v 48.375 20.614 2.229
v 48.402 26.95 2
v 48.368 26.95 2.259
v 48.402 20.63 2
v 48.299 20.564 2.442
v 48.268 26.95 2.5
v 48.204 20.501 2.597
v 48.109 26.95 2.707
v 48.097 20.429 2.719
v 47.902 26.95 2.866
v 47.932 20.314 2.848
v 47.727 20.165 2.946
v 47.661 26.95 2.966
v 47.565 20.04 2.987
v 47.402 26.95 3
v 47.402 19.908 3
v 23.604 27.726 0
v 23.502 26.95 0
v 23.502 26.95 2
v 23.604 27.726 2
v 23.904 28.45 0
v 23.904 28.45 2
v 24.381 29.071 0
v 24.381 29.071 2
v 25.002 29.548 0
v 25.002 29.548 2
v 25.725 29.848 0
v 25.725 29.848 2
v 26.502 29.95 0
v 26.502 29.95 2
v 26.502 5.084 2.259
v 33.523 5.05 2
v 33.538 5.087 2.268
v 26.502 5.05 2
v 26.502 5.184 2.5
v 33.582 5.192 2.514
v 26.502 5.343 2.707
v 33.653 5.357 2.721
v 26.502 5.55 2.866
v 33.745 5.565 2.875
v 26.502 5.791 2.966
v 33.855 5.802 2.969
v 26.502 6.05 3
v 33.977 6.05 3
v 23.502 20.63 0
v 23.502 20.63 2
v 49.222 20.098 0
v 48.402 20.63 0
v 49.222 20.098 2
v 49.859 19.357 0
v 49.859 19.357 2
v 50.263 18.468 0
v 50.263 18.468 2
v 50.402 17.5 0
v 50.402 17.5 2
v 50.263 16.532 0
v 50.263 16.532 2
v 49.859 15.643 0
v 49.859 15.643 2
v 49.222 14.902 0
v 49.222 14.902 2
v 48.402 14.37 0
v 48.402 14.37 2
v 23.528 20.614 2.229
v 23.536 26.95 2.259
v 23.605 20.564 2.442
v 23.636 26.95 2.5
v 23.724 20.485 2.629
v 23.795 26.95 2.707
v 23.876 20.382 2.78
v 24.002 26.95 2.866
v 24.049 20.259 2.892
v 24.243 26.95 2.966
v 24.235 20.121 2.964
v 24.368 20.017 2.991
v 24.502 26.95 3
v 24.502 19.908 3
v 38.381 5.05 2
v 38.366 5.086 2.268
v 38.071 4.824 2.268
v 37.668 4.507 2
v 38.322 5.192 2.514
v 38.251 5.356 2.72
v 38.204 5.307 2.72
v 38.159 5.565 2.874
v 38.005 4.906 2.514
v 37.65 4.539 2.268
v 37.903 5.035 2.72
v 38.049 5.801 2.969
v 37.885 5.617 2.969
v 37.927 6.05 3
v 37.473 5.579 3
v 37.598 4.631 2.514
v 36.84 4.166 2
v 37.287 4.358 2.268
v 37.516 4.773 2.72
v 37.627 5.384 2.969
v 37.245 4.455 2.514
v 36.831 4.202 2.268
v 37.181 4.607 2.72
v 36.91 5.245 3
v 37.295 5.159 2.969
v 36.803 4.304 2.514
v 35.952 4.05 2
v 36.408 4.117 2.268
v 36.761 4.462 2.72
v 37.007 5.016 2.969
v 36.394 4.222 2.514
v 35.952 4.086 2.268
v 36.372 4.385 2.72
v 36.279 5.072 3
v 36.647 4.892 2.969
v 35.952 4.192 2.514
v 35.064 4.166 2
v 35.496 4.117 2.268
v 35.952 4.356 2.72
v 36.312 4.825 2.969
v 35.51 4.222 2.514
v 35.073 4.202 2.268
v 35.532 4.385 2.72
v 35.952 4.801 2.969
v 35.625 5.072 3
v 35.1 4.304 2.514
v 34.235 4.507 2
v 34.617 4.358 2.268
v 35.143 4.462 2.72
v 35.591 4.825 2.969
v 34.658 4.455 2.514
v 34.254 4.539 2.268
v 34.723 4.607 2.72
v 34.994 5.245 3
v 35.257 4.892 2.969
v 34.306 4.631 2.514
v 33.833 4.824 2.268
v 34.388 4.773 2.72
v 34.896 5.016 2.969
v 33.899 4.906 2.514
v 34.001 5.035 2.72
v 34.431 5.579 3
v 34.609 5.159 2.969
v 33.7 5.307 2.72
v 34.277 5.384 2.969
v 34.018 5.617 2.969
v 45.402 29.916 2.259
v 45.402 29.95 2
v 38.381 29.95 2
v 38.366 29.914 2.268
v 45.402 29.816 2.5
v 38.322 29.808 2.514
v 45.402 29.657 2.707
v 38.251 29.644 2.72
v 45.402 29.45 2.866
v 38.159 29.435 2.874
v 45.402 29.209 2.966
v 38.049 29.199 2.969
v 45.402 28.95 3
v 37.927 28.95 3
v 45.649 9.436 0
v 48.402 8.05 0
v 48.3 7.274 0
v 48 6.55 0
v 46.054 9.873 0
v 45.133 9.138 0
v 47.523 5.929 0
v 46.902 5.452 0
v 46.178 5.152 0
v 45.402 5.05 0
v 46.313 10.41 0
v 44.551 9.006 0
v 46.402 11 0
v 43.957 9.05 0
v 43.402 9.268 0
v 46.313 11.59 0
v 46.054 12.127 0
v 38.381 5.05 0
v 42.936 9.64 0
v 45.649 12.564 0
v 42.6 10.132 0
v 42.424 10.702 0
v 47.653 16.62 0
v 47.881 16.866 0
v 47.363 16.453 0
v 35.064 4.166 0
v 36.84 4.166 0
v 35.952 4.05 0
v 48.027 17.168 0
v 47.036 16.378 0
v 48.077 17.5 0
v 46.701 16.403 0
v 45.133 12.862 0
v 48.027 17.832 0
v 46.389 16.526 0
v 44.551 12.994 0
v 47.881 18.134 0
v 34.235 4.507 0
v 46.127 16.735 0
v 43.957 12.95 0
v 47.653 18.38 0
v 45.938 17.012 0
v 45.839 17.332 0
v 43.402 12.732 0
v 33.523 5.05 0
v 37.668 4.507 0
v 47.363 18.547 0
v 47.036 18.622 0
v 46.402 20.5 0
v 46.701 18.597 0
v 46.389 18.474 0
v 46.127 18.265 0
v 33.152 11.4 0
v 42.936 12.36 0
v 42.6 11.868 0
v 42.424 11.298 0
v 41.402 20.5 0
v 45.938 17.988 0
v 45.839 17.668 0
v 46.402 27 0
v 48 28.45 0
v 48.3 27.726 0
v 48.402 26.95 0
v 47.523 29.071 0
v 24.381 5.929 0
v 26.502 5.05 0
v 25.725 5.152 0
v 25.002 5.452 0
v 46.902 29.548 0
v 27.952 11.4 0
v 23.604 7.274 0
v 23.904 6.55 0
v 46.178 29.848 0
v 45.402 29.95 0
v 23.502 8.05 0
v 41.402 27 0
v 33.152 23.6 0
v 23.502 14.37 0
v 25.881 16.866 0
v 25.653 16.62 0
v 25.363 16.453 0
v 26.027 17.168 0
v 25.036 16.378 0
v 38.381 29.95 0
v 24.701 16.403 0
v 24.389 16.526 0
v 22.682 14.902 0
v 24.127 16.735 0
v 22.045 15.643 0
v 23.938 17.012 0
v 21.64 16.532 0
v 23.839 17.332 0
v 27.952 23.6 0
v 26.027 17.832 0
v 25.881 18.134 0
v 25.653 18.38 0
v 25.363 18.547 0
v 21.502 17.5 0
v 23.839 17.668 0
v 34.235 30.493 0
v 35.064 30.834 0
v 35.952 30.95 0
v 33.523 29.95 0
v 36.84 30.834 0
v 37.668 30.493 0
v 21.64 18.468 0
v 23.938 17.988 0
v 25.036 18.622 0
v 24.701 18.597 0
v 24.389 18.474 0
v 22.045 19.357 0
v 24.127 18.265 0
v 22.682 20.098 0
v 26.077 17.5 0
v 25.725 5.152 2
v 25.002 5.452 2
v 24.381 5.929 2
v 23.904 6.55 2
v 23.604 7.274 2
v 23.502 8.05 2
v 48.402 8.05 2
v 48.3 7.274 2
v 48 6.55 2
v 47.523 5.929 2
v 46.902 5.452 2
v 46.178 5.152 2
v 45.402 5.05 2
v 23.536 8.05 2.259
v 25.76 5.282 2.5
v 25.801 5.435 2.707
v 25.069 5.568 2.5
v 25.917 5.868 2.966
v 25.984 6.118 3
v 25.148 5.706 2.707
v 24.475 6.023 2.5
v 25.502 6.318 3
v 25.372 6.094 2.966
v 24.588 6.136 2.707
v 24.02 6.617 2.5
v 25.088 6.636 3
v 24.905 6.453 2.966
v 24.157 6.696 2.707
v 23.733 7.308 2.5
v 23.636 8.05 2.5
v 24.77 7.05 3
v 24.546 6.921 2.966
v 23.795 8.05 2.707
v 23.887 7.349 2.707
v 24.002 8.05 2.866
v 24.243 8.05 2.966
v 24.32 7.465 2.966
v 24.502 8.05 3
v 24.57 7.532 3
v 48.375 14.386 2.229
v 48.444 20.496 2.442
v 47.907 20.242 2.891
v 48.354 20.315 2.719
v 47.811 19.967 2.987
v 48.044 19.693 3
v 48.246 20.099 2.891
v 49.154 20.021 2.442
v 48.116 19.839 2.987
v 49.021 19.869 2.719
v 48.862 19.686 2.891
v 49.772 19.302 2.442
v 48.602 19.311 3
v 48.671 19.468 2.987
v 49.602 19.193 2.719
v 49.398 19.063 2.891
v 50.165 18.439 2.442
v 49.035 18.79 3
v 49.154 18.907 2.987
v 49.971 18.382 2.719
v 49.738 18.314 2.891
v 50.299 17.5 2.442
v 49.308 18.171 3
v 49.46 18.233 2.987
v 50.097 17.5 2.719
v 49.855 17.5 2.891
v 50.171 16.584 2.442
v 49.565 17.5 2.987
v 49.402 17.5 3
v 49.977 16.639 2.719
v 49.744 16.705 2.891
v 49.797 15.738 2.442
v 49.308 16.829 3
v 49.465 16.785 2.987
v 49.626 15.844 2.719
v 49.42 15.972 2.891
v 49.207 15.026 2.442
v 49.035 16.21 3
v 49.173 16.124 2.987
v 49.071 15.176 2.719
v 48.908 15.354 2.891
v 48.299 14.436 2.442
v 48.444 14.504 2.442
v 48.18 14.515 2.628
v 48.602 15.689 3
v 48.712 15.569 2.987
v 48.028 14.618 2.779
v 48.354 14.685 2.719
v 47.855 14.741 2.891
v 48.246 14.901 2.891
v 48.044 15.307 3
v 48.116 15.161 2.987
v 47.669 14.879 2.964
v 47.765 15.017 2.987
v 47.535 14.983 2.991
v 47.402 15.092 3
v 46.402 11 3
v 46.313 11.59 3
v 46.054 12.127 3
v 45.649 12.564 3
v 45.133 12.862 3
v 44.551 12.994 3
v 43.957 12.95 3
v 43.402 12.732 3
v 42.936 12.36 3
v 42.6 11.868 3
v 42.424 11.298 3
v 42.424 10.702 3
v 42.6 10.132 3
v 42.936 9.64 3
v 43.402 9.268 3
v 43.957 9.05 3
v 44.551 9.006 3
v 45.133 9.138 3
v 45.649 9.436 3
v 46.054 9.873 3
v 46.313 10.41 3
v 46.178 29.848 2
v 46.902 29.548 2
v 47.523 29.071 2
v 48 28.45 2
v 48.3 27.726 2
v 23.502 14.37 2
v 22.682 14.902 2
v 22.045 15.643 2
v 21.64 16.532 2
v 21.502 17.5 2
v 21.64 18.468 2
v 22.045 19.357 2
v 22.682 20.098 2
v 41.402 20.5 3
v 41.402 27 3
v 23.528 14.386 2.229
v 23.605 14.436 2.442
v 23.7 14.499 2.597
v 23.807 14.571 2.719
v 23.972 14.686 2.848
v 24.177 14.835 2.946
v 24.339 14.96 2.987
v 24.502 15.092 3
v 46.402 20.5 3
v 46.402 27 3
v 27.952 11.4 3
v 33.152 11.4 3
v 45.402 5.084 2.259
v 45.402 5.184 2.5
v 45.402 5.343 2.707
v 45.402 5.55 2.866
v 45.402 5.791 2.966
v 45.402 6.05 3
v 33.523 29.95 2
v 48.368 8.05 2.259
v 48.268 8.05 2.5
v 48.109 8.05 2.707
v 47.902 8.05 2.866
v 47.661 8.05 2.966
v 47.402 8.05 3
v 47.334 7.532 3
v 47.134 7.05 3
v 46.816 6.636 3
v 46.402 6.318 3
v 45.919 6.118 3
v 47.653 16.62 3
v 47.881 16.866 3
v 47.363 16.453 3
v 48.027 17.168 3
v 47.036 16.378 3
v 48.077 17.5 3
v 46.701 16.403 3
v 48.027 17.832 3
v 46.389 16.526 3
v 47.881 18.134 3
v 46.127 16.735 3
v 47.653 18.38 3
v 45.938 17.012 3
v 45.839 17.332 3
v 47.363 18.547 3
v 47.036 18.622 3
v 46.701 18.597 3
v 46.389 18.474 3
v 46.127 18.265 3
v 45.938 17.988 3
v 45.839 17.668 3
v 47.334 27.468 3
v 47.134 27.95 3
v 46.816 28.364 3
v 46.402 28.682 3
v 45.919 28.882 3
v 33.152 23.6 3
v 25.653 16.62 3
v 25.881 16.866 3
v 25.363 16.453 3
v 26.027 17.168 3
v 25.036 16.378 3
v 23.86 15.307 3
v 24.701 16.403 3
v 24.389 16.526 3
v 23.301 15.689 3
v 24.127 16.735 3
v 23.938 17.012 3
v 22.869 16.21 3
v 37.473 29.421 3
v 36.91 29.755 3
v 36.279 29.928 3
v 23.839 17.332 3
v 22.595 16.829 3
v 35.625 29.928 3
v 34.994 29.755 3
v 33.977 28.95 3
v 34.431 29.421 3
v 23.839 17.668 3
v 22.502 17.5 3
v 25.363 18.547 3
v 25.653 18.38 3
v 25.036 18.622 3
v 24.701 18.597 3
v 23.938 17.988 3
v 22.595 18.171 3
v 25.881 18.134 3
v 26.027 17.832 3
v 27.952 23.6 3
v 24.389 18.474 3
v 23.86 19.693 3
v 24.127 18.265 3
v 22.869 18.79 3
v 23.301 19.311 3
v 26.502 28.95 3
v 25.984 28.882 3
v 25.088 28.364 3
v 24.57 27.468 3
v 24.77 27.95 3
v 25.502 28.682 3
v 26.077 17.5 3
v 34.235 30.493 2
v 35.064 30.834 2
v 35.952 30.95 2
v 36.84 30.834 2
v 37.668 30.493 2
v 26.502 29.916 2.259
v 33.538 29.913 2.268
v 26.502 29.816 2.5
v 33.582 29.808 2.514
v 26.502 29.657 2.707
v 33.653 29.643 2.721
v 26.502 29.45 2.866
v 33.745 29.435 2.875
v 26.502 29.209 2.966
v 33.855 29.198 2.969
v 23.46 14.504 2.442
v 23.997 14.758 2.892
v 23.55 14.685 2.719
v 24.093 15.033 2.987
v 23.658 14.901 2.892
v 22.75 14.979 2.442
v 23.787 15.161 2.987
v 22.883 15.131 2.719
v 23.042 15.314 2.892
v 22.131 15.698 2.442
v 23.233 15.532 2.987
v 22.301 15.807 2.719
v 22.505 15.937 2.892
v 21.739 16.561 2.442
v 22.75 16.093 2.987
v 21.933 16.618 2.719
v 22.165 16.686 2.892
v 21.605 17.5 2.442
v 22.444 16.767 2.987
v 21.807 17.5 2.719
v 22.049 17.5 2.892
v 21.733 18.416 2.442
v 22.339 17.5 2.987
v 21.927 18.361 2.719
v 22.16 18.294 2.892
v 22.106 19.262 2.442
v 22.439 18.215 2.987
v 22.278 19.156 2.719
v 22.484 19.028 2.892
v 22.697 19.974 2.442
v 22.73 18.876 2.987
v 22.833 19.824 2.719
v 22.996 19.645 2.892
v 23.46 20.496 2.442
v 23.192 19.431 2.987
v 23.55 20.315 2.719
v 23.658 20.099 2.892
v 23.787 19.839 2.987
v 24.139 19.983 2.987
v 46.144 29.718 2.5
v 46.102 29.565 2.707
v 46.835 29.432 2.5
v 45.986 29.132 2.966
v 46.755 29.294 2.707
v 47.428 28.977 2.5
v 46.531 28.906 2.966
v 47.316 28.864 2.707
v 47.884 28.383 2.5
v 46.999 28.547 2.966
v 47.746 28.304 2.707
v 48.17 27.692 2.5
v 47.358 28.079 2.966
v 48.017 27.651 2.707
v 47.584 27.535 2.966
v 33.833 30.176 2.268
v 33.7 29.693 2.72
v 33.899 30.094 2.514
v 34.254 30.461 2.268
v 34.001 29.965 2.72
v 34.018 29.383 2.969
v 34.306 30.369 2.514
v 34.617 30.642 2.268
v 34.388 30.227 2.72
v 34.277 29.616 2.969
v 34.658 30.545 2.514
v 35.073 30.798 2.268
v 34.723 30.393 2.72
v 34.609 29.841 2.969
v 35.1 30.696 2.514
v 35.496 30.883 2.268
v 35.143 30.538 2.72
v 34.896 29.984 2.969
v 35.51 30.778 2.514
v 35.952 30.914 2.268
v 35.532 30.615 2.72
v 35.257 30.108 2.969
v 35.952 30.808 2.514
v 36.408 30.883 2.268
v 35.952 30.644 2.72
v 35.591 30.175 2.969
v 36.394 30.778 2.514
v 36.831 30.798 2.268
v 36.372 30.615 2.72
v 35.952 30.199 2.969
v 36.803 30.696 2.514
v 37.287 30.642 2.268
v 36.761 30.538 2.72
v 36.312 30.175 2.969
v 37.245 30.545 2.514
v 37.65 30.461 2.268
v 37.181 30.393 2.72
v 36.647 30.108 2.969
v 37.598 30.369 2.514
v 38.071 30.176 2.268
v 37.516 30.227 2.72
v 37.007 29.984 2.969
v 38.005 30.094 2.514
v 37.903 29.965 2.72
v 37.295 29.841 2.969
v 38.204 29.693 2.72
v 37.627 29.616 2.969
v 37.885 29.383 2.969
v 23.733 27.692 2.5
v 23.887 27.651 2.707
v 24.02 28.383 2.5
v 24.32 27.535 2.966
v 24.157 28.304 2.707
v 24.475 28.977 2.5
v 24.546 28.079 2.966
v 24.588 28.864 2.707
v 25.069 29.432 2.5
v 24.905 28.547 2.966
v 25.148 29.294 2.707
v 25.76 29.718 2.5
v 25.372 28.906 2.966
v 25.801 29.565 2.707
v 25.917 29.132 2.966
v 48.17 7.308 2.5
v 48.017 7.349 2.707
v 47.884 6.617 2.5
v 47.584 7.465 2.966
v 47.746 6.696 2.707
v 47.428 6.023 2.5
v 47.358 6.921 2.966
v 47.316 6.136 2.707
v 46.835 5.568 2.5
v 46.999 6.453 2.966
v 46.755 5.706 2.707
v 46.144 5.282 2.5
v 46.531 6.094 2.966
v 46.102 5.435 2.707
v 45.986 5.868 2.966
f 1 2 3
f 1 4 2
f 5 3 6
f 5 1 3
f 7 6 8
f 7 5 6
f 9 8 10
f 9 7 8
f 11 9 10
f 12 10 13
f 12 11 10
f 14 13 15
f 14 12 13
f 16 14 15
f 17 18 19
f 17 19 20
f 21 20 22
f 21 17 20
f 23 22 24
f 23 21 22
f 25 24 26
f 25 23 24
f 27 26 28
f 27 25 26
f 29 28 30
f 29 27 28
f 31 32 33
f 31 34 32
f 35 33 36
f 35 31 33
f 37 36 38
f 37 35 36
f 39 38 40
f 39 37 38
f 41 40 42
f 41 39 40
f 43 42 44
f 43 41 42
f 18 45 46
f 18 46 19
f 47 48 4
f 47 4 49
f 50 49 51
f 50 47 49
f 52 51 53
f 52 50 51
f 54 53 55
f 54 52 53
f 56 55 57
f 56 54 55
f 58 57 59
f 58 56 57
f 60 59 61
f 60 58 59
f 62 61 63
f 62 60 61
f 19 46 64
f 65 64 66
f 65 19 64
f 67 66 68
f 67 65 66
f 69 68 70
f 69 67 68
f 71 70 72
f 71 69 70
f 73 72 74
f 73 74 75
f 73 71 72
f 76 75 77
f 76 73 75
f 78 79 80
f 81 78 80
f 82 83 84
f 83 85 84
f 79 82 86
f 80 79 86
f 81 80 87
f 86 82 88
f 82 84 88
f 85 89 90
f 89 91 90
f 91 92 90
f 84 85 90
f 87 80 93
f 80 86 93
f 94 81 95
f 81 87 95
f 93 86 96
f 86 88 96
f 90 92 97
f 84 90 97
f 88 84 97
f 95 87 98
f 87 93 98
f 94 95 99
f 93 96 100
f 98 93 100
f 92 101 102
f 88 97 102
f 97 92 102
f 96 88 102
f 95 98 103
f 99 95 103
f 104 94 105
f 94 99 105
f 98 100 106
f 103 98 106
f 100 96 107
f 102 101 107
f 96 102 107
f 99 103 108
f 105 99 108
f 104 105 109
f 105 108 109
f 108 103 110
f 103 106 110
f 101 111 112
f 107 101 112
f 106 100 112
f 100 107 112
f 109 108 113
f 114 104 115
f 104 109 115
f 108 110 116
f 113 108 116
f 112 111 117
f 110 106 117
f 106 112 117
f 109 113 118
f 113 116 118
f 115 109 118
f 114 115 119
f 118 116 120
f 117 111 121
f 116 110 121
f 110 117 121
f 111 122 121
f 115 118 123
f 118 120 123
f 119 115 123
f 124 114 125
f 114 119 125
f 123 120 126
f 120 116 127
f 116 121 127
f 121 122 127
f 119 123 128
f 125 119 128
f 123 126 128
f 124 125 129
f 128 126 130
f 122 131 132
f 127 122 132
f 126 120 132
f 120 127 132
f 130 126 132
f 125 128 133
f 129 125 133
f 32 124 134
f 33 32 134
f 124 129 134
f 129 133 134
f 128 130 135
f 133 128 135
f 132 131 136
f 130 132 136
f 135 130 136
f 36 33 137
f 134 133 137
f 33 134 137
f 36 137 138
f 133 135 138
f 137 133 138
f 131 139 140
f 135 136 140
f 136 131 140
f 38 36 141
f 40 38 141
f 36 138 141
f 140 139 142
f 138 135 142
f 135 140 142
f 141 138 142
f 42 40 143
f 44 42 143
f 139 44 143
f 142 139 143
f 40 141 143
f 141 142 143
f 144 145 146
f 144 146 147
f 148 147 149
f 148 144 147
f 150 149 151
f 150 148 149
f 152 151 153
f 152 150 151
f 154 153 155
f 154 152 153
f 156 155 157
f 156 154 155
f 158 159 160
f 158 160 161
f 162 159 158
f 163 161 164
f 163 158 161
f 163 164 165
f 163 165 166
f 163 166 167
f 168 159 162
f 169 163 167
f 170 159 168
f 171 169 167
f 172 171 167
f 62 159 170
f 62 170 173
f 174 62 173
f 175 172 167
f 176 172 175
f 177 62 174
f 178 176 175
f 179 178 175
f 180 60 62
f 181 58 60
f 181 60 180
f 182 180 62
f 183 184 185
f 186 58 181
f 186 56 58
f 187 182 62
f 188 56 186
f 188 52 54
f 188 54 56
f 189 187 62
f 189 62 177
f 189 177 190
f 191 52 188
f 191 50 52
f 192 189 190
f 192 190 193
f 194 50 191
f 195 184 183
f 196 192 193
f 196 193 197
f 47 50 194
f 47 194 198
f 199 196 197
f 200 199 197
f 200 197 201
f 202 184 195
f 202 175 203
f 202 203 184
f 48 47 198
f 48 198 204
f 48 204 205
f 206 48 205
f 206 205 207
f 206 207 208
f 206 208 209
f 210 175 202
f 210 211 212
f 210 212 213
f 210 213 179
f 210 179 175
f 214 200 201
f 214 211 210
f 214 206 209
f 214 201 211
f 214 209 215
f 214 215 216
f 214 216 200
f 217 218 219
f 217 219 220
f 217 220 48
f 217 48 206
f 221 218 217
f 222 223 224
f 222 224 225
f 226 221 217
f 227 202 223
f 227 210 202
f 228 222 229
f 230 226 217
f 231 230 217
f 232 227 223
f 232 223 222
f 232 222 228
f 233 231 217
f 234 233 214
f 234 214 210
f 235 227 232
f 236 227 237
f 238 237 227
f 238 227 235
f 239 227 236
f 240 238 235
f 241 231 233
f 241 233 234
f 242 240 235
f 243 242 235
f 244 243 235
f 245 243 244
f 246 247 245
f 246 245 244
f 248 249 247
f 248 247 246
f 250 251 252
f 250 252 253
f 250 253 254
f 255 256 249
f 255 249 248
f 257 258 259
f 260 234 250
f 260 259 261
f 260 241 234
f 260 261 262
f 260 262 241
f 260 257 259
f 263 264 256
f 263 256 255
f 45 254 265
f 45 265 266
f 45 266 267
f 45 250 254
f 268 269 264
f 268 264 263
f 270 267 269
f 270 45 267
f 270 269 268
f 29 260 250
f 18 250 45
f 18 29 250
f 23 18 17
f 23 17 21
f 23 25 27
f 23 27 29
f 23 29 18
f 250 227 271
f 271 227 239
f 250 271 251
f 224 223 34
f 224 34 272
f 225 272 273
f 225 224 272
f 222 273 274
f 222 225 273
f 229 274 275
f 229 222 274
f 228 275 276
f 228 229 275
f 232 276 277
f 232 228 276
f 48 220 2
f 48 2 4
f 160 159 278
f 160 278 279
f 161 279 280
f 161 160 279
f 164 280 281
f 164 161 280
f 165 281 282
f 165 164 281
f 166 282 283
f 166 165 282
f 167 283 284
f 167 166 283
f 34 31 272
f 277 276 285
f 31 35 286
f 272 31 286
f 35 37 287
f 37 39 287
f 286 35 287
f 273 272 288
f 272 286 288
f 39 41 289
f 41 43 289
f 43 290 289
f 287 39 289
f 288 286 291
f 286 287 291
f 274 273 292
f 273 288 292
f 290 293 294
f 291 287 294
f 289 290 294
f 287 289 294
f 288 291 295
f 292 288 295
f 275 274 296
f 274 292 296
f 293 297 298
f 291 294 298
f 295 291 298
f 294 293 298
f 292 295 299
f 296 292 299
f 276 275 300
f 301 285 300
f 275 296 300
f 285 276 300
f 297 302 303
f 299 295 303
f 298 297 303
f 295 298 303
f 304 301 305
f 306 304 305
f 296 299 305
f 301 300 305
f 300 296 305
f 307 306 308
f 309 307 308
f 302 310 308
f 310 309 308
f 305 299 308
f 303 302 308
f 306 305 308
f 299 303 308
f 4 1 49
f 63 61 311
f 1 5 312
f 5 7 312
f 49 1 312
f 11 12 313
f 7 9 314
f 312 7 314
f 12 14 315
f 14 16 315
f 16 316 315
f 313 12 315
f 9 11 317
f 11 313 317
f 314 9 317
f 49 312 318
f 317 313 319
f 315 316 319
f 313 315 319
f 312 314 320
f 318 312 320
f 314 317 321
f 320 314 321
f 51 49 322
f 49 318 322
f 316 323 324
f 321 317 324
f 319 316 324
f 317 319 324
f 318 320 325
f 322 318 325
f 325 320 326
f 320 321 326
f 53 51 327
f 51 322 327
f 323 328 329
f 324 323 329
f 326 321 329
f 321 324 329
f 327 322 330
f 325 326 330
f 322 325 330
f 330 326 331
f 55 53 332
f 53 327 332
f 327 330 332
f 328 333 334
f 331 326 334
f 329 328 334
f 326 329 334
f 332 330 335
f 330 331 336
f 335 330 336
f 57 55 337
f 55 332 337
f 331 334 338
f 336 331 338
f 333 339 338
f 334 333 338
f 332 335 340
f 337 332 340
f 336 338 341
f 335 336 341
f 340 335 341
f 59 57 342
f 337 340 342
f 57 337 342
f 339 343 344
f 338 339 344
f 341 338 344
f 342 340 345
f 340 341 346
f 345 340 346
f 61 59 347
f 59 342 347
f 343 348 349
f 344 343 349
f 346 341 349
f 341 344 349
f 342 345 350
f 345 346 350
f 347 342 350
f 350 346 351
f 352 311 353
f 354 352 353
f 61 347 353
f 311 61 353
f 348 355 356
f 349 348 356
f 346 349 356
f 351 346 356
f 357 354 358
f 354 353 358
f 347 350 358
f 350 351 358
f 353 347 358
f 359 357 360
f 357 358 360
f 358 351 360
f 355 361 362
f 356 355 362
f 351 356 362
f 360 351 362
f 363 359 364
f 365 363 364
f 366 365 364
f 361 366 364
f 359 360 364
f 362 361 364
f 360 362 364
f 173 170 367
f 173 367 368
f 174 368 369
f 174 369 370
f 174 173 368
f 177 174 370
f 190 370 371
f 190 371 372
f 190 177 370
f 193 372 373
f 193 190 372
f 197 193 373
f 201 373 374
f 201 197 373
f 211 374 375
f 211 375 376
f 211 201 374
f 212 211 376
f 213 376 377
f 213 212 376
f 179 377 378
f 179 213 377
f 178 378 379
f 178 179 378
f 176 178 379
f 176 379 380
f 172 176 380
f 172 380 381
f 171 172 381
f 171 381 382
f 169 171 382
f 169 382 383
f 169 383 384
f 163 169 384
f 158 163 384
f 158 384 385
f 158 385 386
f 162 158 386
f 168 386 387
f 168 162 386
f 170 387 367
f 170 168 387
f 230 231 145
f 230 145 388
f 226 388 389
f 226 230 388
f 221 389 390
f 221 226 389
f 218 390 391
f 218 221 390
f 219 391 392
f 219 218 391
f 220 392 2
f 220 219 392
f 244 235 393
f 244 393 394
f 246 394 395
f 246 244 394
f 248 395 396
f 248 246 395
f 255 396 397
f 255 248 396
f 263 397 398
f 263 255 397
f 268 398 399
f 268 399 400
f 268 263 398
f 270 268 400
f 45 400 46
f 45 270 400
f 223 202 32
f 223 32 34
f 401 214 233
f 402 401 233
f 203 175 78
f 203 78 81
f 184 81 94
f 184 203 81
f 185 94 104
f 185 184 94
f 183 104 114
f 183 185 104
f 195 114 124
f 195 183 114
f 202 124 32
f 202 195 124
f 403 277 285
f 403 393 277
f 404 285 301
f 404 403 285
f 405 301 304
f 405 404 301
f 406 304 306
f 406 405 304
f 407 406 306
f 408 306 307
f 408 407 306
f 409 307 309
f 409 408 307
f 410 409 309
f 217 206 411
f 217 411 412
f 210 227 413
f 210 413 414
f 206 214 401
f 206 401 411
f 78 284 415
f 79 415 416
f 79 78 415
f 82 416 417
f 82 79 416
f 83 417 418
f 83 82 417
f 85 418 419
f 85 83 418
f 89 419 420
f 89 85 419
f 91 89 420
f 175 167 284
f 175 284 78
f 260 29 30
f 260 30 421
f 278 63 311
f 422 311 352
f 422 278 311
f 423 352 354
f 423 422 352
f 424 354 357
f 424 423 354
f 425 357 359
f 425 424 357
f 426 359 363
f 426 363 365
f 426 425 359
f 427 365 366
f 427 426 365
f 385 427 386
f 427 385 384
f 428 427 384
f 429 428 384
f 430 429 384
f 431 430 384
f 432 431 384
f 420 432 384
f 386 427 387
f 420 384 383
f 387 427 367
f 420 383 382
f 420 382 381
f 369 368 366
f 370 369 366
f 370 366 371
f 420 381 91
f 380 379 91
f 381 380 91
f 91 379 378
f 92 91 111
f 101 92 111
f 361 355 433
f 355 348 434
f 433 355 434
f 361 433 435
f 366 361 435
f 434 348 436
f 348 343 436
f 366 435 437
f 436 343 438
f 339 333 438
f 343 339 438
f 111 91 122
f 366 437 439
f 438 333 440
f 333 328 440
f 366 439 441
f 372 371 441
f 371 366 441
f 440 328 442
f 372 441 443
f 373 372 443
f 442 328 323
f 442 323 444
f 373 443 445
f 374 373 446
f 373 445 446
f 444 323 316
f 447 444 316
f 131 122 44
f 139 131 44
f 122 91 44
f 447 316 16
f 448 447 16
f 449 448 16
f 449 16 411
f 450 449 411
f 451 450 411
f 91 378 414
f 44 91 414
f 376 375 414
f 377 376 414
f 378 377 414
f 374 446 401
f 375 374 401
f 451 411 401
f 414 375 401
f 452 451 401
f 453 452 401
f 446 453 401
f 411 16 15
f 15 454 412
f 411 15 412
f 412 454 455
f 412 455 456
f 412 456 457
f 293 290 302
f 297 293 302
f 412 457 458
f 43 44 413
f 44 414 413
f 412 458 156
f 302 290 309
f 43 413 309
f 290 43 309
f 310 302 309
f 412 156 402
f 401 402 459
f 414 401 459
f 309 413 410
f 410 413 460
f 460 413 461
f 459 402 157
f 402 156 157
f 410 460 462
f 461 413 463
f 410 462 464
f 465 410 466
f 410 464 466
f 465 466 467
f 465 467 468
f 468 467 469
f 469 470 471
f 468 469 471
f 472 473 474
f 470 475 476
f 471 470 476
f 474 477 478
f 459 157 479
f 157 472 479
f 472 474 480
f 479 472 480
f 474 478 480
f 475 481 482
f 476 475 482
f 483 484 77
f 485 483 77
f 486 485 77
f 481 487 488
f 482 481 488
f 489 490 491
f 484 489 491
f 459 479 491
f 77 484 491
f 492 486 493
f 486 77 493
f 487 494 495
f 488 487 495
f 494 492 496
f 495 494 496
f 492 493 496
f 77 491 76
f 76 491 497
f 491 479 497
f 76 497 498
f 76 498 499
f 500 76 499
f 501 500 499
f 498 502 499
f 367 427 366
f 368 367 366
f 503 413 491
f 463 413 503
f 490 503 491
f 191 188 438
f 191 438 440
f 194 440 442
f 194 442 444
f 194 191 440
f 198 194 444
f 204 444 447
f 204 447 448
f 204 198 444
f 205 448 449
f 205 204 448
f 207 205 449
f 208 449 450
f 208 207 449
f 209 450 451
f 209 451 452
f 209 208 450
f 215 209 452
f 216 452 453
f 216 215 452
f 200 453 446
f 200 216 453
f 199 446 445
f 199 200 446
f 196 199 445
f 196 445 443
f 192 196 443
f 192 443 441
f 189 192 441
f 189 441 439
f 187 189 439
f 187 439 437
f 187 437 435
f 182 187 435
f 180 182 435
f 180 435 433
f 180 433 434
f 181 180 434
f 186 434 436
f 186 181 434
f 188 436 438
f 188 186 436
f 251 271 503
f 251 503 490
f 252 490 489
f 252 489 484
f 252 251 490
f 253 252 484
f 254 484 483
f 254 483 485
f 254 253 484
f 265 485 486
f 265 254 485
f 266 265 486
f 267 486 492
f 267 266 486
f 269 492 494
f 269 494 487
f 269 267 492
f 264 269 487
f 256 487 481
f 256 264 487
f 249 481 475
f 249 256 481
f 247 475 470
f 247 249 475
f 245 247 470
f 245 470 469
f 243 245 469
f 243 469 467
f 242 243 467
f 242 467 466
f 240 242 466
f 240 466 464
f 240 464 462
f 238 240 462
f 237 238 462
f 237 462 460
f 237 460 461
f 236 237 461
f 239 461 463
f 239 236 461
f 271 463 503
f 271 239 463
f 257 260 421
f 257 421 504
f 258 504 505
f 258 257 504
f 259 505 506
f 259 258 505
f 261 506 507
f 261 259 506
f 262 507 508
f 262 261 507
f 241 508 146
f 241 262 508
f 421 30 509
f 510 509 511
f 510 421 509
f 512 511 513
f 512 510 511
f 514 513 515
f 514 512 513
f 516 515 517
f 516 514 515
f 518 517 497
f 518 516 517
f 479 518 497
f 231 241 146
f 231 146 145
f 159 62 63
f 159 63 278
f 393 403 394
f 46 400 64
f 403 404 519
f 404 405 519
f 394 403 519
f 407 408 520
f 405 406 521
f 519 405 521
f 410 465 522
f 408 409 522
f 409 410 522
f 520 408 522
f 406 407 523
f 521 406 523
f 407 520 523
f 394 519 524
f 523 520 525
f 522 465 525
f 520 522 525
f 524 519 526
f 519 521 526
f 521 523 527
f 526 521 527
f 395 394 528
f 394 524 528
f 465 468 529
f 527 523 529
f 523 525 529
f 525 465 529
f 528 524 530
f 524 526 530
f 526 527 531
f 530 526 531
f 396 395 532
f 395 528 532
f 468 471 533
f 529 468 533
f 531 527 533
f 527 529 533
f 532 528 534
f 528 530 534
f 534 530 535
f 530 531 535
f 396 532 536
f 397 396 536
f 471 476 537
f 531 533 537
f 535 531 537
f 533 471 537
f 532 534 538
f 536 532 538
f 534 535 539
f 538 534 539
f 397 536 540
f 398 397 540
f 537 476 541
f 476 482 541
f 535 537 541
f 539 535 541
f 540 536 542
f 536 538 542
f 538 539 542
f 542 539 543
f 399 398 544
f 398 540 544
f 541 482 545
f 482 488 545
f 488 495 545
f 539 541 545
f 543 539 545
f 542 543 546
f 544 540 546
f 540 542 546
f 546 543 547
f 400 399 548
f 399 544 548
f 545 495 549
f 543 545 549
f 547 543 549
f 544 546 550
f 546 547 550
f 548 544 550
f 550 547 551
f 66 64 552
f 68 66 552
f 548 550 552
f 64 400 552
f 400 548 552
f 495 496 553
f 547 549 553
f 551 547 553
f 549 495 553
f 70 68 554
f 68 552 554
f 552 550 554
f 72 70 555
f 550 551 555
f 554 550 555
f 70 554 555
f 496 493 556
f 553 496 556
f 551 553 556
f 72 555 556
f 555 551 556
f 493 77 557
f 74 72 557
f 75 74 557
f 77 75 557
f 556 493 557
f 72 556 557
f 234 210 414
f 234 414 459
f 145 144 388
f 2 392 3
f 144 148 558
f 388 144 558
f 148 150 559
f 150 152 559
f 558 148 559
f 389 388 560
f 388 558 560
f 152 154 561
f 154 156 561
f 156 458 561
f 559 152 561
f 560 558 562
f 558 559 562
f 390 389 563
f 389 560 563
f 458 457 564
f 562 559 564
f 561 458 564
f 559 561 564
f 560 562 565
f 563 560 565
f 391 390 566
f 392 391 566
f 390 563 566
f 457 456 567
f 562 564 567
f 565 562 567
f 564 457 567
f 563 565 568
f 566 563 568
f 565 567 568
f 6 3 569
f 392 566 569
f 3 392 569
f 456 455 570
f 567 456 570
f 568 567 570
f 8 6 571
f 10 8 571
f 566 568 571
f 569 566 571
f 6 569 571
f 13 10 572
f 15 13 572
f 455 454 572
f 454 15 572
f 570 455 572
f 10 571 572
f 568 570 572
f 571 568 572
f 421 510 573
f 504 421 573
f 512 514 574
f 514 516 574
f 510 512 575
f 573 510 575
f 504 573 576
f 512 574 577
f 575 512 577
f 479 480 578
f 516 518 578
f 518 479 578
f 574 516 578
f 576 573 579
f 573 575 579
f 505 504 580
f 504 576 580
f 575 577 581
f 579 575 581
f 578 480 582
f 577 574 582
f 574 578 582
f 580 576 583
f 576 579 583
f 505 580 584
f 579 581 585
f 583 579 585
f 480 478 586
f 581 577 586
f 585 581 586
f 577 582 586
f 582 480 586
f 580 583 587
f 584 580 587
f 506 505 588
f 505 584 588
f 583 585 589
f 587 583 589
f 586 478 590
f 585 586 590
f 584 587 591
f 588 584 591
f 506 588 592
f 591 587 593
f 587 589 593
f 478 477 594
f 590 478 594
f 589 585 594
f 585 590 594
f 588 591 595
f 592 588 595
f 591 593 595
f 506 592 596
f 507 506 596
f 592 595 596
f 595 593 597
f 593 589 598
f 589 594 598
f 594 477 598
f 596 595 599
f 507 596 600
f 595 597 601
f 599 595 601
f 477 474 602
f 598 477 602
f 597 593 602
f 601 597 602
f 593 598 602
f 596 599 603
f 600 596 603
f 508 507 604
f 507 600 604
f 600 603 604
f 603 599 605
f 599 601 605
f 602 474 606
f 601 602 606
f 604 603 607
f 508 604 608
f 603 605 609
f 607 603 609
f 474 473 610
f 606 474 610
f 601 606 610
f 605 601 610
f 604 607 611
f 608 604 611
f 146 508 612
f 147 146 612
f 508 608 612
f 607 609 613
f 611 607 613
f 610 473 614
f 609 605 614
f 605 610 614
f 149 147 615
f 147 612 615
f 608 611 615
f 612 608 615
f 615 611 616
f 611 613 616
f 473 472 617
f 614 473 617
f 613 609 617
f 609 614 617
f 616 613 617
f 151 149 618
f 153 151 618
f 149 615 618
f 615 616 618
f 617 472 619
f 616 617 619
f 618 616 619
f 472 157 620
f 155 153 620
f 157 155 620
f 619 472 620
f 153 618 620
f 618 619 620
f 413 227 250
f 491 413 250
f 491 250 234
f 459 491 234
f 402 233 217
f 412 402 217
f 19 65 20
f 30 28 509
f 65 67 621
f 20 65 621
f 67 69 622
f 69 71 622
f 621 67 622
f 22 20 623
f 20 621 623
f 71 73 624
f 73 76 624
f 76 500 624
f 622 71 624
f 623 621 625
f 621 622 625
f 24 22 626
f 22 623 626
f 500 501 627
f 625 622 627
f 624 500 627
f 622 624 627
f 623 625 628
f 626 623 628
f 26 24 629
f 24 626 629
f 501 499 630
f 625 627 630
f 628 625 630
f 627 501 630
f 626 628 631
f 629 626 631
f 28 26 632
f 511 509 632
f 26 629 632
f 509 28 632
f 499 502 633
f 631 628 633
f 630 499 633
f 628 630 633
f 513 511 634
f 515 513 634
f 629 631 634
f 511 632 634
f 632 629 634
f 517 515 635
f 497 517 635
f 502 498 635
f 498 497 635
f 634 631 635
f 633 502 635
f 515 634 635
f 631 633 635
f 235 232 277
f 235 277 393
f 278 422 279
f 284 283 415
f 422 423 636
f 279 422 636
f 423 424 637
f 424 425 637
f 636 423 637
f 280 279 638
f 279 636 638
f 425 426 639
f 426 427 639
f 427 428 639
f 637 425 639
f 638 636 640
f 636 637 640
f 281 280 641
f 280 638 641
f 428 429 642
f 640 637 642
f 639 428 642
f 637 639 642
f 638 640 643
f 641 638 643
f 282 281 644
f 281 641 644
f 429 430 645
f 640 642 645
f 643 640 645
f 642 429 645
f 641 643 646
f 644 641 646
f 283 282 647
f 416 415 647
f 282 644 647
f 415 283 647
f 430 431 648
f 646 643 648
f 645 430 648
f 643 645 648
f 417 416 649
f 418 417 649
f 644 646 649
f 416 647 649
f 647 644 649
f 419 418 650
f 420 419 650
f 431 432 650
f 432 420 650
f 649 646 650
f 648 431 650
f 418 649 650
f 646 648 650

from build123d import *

# Parameters (mm, degrees)
SKETCH1_R           = 1.125
SKETCH1_R_2         = 2
SKETCH1_W           = 5.2
SKETCH1_H           = 12.2
SKETCH1_W_2         = 5
SKETCH1_H_2         = 6.5
BOSS_EXTRUDE1_DEPTH = 3
FILLET1_R           = 1


with BuildPart() as part:
    # Sketch1 → Boss-Extrude1 (new body)
    with BuildSketch(Plane.XY):
        with BuildLine():
            Line((23.501825189, 8.05), (23.501825189, 14.369504832))
            ThreePointArc((23.501825189, 14.369504832), (21.501825189, 17.5), (23.501825189, 20.630495168))
            Line((23.501825189, 20.630495168), (23.501825189, 26.95))
            ThreePointArc((23.501825189, 26.95), (24.380504846, 29.071320344), (26.501825189, 29.95))
            Line((26.501825189, 29.95), (33.522833629, 29.95))
            ThreePointArc((33.522833629, 29.95), (35.951825189, 30.95), (38.38081675, 29.95))
            Line((38.38081675, 29.95), (45.401825189, 29.95))
            ThreePointArc((45.401825189, 29.95), (47.523145533, 29.071320344), (48.401825189, 26.95))
            Line((48.401825189, 26.95), (48.401825189, 20.630495168))
            ThreePointArc((48.401825189, 20.630495168), (50.401825189, 17.5), (48.401825189, 14.369504832))
            Line((48.401825189, 14.369504832), (48.401825189, 8.05))
            ThreePointArc((48.401825189, 8.05), (47.523145533, 5.928679656), (45.401825189, 5.05))
            Line((45.401825189, 5.05), (38.38081675, 5.05))
            ThreePointArc((38.38081675, 5.05), (35.951825189, 4.05), (33.522833629, 5.05))
            Line((33.522833629, 5.05), (26.501825189, 5.05))
            ThreePointArc((26.501825189, 5.05), (24.380504846, 5.928679656), (23.501825189, 8.05))
        make_face()
        with Locations((24.951825189, 17.5)):
            Circle(SKETCH1_R, mode=Mode.SUBTRACT)
        with Locations((46.951825189, 17.5)):
            Circle(SKETCH1_R, mode=Mode.SUBTRACT)
        with Locations((44.401825189, 11)):
            Circle(SKETCH1_R_2, mode=Mode.SUBTRACT)
        with Locations((30.551825189, 17.5)):
            Rectangle(SKETCH1_W, SKETCH1_H, mode=Mode.SUBTRACT)
        with Locations((43.901825189, 23.75)):
            Rectangle(SKETCH1_W_2, SKETCH1_H_2, mode=Mode.SUBTRACT)
    extrude(amount=BOSS_EXTRUDE1_DEPTH)

    # Fillet1
    fillet1_edges = [part.edges().sort_by_distance(p)[0] for p in [
        (35.951825189, 4.05, 3),
        (41.891320969, 5.05, 3),
        (47.523145533, 5.928679656, 3),
        (48.401825189, 11.209752416, 3),
        (50.401825189, 17.5, 3),
        (48.401825189, 23.790247584, 3),
        (47.523145533, 29.071320344, 3),
        (41.891320969, 29.95, 3),
        (35.951825189, 30.95, 3),
        (30.012329409, 29.95, 3),
        (24.380504846, 5.928679656, 3),
        (24.380504846, 29.071320344, 3),
        (23.501825189, 23.790247584, 3),
        (21.501825189, 17.5, 3),
        (23.501825189, 11.209752416, 3),
        (30.012329409, 5.05, 3),
    ]]
    fillet(fillet1_edges, radius=FILLET1_R)


solid = part.part
